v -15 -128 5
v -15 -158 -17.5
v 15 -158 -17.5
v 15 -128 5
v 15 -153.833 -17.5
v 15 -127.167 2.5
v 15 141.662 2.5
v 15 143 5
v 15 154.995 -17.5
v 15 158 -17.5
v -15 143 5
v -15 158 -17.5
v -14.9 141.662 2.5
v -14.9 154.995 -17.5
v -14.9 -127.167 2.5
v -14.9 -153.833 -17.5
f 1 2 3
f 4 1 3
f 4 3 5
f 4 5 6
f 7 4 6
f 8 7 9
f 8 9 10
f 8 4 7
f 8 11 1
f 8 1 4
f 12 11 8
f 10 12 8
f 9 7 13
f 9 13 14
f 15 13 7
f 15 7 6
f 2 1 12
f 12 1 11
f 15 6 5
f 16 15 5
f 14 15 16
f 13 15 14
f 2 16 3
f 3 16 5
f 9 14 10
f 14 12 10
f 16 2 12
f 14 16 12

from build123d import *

# Parameters (mm, degrees)
F0_W     = 30
F0_H     = 316
F1_DEPTH = 5
F2_DEPTH = 17.5
F3_SIZE2 = 14.99999
F3_SIZE  = 22.49999
F4_SIZE2 = 22.49999
F4_SIZE  = 29.99999
F5_T     = 2.5
F6_DEPTH = 2.4
F7_DEPTH = 25


# Not quite as in the source:
# - a fillet or chamfer is up to 0.001 mm smaller than in the source, because OpenCascade refuses the exact size
# - a shell that OpenCascade refuses in one call is made with other operations: the cavity is built on its own and cut out


with BuildPart() as f1:
    # F0 (on Top) → F1 (new body)
    with BuildSketch(Plane.XY):
        Rectangle(F0_W, F0_H)
    extrude(amount=F1_DEPTH)

    # F2 (add): a face of the model
    f2_faces = [f1.faces().sort_by_distance(p)[0] for p in [
        (0, 0, 0),
    ]]
    extrude(f2_faces, amount=F2_DEPTH)

    # F3 (size 22.5 and 15 in the source; OpenCascade refuses exactly that, so slightly less here)
    f3_edges = [f1.edges().sort_by_distance(p)[0] for p in [
        (0, 158, 5),
    ]]
    f3_side = f1.faces().sort_by_distance((0, 158, -6.25))[0]
    chamfer(f3_edges, length=F3_SIZE, length2=F3_SIZE2, reference=f3_side)

    # F4 (size 30 and 22.5 in the source; OpenCascade refuses exactly that, so slightly less here)
    f4_edges = [f1.edges().sort_by_distance(p)[0] for p in [
        (0, -158, 5),
    ]]
    f4_side = f1.faces().sort_by_distance((0, -7.499995, 5))[0]
    chamfer(f4_edges, length=F4_SIZE, length2=F4_SIZE2, reference=f4_side)

    # F5: shell of thickness 2.5, made by hand


with BuildPart() as f5_core1:
    # F5_t2: copy of F1
    add(f1.part)

    # the walls: a layer under each face that stays
    f5_faces = [f5_core1.faces().sort_by_distance(p)[0] for p in [
        (15, 0, -6.25),
        (0, 7.5, 5),
        (0, -143.000005, -6.249995),
        (0, 150.500005, -6.249995),
        (0, -158, -17.499995),
        (0, 158, -17.499995),
        (-15, 0, -6.25),
    ]]
    thicken(f5_faces, amount=-F5_T, mode=Mode.SUBTRACT)


with BuildPart() as f1_1:
    add(f1.part)

    # what is left inside the walls is the cavity
    f5_cavity = [f5_core1.part.solids().sort_by_distance(p)[0] for p in [
        (0, -50.890437, -17.475),
    ]]
    add(f5_cavity, mode=Mode.SUBTRACT)

    # F6 (cut): a face of the model
    f6_faces = [f1_1.faces().sort_by_distance(p)[0] for p in [
        (-12.5, 3.8374129004, -7.7308172989),
    ]]
    extrude(f6_faces, amount=-F6_DEPTH, mode=Mode.SUBTRACT)

    # F7 (cut): a face of the model
    f7_faces = [f1_1.faces().sort_by_distance(p)[0] for p in [
        (12.5, 3.8374129004, -7.7308172989),
    ]]
    extrude(f7_faces, amount=-F7_DEPTH, mode=Mode.SUBTRACT)


solid = f1_1.part
